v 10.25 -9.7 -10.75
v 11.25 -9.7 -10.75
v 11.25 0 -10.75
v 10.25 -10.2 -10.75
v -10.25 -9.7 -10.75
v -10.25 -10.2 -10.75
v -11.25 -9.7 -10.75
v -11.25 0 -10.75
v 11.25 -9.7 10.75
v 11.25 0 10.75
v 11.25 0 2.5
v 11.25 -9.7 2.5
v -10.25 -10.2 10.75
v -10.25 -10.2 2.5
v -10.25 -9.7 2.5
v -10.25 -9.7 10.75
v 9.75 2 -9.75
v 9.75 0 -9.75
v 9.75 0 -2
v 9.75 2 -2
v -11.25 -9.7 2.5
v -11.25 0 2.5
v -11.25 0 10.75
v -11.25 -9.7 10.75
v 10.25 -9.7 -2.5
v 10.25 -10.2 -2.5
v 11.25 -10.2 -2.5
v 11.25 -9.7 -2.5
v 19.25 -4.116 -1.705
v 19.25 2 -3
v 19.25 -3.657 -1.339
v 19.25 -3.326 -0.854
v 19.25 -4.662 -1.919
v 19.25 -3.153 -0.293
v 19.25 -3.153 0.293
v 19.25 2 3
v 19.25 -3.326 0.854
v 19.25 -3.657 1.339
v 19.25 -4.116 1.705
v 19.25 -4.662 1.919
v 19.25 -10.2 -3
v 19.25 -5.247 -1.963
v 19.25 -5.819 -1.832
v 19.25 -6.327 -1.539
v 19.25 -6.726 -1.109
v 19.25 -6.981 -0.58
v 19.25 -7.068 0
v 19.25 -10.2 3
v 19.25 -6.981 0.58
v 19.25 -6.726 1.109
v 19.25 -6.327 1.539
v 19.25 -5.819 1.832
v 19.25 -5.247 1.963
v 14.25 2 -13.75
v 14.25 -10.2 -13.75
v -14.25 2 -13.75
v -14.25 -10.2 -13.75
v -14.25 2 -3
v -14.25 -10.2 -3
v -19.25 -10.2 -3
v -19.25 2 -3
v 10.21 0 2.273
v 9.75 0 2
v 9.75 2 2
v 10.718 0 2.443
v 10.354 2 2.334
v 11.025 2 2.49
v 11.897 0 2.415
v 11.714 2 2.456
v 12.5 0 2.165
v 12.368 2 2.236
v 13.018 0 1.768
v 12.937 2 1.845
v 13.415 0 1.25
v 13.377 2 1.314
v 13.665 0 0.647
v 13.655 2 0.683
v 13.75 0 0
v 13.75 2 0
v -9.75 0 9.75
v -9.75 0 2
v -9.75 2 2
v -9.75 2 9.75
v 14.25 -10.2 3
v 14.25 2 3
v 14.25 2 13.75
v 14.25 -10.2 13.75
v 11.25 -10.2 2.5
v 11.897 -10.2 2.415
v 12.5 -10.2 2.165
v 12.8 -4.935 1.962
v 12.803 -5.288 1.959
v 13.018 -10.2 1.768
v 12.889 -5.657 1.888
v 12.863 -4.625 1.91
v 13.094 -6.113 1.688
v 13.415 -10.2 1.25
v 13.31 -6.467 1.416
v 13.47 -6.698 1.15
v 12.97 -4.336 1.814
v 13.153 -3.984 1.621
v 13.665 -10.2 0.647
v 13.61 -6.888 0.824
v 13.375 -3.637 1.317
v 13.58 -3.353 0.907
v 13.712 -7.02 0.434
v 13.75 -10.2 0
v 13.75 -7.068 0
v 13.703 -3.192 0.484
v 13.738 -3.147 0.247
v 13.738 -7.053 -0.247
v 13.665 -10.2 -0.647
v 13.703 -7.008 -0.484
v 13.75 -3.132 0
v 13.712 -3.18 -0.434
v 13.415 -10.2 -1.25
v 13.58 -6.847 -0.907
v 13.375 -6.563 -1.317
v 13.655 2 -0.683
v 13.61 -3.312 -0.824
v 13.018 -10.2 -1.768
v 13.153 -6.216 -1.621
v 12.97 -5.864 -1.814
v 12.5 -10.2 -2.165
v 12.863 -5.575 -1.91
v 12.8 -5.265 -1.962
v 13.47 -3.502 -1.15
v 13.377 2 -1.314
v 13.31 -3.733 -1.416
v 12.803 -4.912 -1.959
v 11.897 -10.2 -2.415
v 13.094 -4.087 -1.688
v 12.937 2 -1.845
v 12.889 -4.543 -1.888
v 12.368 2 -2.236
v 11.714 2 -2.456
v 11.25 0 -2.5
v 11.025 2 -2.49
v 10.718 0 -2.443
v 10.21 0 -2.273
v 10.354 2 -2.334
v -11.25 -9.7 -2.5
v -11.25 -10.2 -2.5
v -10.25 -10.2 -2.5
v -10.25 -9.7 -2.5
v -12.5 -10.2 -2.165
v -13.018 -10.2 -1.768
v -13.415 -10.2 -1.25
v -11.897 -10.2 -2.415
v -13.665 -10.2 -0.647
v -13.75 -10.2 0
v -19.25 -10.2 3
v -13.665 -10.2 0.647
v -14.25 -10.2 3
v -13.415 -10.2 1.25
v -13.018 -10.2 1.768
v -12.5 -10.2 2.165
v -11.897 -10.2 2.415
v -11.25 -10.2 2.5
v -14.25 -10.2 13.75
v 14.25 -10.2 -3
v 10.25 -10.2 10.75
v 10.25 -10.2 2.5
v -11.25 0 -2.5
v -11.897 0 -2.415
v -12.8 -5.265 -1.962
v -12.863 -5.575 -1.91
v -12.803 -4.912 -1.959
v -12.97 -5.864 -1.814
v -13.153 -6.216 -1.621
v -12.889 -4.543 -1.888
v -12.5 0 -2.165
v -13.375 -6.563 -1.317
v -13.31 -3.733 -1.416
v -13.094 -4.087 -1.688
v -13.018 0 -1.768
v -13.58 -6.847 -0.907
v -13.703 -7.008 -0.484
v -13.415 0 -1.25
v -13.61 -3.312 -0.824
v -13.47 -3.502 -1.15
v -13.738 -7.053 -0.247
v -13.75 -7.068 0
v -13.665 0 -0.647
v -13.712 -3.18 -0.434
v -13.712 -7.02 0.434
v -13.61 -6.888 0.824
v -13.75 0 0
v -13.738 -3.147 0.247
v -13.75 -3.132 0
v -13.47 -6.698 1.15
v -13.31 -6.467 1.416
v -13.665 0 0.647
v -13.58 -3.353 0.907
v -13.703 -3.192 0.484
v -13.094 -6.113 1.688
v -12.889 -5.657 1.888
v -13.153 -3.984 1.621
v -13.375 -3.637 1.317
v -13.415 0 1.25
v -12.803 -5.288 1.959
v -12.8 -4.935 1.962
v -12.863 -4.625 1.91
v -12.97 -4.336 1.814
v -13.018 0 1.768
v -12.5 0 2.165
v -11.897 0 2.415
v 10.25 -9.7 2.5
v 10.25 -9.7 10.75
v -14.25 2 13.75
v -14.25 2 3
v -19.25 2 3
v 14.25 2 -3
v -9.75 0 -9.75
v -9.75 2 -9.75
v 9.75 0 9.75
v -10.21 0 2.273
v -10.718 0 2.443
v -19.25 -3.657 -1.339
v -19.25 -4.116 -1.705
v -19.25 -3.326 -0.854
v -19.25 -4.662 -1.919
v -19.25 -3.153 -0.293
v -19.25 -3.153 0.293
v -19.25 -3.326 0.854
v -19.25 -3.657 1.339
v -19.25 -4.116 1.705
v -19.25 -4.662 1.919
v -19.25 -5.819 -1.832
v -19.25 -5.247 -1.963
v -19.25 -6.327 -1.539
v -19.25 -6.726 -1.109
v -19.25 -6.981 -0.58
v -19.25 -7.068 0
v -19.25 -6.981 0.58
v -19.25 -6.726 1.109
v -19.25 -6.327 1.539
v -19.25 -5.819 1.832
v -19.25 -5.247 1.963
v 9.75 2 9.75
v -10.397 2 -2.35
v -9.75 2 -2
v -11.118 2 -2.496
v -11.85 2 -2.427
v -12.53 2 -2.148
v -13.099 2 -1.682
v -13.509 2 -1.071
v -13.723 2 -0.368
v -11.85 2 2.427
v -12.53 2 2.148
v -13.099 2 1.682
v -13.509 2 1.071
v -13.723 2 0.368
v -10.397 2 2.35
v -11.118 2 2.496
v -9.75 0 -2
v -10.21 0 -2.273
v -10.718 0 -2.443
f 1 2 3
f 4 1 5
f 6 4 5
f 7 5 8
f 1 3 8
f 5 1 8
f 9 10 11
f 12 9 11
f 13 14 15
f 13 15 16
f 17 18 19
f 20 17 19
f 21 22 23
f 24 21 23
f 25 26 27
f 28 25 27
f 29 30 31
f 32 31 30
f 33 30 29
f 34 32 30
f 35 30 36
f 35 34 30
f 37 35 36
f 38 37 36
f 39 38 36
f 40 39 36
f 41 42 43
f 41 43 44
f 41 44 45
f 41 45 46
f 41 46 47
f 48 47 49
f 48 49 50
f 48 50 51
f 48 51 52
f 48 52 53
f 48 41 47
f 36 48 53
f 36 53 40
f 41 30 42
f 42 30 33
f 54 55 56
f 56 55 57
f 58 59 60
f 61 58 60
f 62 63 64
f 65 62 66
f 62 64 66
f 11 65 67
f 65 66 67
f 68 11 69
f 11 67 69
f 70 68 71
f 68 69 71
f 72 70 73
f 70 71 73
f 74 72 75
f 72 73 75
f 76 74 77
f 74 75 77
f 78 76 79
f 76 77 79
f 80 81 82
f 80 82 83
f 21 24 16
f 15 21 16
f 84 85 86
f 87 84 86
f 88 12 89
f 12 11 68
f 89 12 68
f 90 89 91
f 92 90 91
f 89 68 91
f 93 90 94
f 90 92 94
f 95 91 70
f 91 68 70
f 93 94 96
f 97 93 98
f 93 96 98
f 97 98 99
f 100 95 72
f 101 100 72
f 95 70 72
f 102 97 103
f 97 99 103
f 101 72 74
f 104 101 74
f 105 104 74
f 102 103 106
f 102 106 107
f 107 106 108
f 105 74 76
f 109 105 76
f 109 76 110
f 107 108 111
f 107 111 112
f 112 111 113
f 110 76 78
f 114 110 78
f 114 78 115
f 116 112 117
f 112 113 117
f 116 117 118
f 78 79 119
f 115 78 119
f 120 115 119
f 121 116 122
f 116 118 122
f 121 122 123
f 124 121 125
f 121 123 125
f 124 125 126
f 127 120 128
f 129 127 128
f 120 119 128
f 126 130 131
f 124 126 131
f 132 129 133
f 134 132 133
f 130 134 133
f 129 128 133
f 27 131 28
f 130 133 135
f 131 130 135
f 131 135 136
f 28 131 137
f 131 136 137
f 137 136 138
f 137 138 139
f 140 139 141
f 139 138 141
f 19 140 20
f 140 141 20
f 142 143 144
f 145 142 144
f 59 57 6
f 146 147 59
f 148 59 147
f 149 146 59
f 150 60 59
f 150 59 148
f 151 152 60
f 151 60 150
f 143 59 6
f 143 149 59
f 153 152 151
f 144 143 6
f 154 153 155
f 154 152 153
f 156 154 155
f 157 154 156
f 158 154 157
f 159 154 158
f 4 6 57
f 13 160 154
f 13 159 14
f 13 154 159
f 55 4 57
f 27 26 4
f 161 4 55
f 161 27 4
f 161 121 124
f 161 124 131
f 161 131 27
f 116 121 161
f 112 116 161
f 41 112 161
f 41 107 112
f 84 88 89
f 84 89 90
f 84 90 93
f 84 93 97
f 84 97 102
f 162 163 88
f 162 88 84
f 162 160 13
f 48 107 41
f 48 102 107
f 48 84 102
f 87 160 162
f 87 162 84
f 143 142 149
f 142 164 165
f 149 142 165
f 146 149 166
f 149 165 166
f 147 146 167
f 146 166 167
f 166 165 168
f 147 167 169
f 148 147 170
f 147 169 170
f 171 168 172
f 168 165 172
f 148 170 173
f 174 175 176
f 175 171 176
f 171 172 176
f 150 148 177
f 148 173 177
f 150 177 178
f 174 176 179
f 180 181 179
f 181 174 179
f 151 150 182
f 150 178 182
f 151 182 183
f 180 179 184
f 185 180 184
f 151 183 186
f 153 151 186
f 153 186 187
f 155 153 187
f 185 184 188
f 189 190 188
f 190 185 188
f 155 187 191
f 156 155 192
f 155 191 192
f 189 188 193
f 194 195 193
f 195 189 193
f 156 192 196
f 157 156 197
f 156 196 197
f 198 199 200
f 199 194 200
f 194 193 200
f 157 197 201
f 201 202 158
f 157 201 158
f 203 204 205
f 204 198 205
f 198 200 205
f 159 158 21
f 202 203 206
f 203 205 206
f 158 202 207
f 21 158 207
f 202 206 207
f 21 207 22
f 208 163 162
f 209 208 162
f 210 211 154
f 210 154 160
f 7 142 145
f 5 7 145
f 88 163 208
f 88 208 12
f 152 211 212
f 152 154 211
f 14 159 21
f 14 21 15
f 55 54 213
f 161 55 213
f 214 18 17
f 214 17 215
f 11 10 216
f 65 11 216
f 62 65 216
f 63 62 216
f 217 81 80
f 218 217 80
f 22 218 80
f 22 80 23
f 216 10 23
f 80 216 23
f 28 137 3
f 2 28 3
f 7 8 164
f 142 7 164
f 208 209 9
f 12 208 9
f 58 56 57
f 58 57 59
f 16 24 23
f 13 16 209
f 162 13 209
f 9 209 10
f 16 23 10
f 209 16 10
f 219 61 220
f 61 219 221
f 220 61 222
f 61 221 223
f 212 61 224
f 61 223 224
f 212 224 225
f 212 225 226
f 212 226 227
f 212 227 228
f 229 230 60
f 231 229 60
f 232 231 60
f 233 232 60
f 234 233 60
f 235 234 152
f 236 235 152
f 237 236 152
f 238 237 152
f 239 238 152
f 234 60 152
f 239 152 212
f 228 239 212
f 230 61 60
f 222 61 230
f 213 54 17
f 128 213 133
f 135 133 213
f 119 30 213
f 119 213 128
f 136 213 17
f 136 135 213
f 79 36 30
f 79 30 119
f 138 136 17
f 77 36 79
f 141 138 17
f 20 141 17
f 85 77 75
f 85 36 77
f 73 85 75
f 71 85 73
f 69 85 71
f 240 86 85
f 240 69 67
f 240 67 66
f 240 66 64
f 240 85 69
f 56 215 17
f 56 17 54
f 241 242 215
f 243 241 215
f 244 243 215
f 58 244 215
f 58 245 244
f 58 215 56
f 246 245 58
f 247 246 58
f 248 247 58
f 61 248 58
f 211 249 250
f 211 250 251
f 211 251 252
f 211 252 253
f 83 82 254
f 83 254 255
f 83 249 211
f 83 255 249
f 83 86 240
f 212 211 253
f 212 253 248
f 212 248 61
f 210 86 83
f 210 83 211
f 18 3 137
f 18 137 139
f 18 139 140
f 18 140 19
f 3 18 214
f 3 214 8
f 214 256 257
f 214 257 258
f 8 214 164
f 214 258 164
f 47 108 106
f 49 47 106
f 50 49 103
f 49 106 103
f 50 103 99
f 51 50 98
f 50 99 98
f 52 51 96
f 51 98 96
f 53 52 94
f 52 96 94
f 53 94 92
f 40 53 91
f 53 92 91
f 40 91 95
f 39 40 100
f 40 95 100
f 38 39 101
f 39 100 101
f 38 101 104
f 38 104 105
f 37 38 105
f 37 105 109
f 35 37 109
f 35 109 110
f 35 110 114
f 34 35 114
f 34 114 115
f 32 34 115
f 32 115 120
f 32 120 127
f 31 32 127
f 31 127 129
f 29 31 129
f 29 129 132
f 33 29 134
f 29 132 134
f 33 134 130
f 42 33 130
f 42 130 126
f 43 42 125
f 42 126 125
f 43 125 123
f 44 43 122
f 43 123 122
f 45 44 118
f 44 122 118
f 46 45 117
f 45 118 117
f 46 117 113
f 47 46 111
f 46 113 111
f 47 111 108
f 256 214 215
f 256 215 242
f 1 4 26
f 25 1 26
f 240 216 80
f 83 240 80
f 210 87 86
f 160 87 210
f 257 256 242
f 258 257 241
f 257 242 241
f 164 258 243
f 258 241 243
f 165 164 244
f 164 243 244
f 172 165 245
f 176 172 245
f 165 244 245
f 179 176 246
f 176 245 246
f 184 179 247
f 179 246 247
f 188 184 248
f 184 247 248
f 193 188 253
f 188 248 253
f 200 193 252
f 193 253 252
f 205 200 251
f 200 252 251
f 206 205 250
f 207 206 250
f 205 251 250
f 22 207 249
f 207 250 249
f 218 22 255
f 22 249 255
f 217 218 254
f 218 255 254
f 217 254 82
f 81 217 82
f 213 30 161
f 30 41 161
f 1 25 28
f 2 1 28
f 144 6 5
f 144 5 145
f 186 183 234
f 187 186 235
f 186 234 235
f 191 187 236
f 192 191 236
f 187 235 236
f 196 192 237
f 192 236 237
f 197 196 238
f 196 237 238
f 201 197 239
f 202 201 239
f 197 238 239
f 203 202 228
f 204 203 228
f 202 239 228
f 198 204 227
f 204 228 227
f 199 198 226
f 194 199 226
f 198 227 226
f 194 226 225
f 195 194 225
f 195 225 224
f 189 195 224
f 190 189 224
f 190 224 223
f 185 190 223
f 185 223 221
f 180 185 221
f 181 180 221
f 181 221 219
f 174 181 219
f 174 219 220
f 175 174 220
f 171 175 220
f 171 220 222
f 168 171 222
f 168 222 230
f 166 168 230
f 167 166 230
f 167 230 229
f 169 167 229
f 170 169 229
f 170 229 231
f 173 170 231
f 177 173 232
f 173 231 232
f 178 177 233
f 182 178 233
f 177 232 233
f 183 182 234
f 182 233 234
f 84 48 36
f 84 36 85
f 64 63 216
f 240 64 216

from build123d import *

# Parameters (mm, degrees)
F1_DEPTH  = 10.2
F2_W      = 28.5
F2_H      = 27.5
F2_W_2    = 19.5
F2_H_2    = 19.5
F3_DEPTH  = 2
F4_R      = 1.9685
F5_DEPTH  = 38.5
F6_W      = 5
F6_H      = 6
F7_DEPTH  = 2
F8_W      = 5
F8_H      = 6
F9_DEPTH  = 2
F10_W     = 1
F10_H     = 8.25
F11_DEPTH = 0.5
F12_R     = 2.5
F13_DEPTH = 12.201


with BuildPart() as f1:
    # F0 (on Front) → F1 (new body)
    with BuildSketch(Plane.XZ):
        with BuildLine():
            Line((-14.25, 3), (-19.25, 3))
            Line((-19.25, 3), (-19.25, 0))
            Line((-19.25, 0), (-13.75, 0))
            ThreePointArc((-13.75, 0), (-13.017766953, 1.767766953), (-11.25, 2.5))
            Line((-11.25, 2.5), (-11.25, 10.75))
            Line((-11.25, 10.75), (0, 10.75))
            Line((0, 10.75), (0, 13.75))
            Line((0, 13.75), (-14.25, 13.75))
            Line((-14.25, 13.75), (-14.25, 3))
        make_face()
        with BuildLine():
            Line((-13.75, 0), (-19.25, 0))
            Line((-19.25, 0), (-19.25, -3))
            Line((-19.25, -3), (-14.25, -3))
            Line((-14.25, -3), (-14.25, -13.75))
            Line((-14.25, -13.75), (0, -13.75))
            Line((0, -13.75), (0, -10.75))
            Line((0, -10.75), (-11.25, -10.75))
            Line((-11.25, -10.75), (-11.25, -2.5))
            ThreePointArc((-11.25, -2.5), (-13.017766953, -1.767766953), (-13.75, 0))
        make_face()
        with BuildLine():
            Line((14.25, 13.75), (0, 13.75))
            Line((0, 13.75), (0, 10.75))
            Line((0, 10.75), (11.25, 10.75))
            Line((11.25, 10.75), (11.25, 2.5))
            ThreePointArc((11.25, 2.5), (13.017766953, 1.767766953), (13.75, 0))
            Line((13.75, 0), (19.25, 0))
            Line((19.25, 0), (19.25, 3))
            Line((19.25, 3), (14.25, 3))
            Line((14.25, 3), (14.25, 13.75))
        make_face()
        with BuildLine():
            Line((11.25, -10.75), (0, -10.75))
            Line((0, -10.75), (0, -13.75))
            Line((0, -13.75), (14.25, -13.75))
            Line((14.25, -13.75), (14.25, -3))
            Line((14.25, -3), (19.25, -3))
            Line((19.25, -3), (19.25, 0))
            Line((19.25, 0), (13.75, 0))
            ThreePointArc((13.75, 0), (13.017766953, -1.767766953), (11.25, -2.5))
            Line((11.25, -2.5), (11.25, -10.75))
        make_face()
    extrude(amount=F1_DEPTH)

    # F2 (on face) → F3 (join)
    with BuildSketch(Plane(origin=(0, 0, 0), x_dir=(-1, 0, 0), z_dir=(0, 1, 0))):
        Rectangle(F2_W, F2_H)
        Rectangle(F2_W_2, F2_H_2, mode=Mode.SUBTRACT)
    extrude(amount=F3_DEPTH)

    # F4 (on face) → F5 (cut, through all)
    with BuildSketch(Plane(origin=(-19.25, 0, 0), x_dir=(0, -1, 0), z_dir=(-1, 0, 0))):
        with Locations((5.1, 0)):
            Circle(F4_R)
    extrude(amount=-F5_DEPTH, mode=Mode.SUBTRACT)

    # F6 (on face) → F7 (join, through all)
    with BuildSketch(Plane(origin=(0, 0, 0), x_dir=(-1, 0, 0), z_dir=(0, 1, 0))):
        with Locations((-16.75, 0)):
            Rectangle(F6_W, F6_H)
    extrude(amount=F7_DEPTH)

    # F8 (on face) → F9 (join, through all)
    with BuildSketch(Plane(origin=(0, 0, 0), x_dir=(-1, 0, 0), z_dir=(0, 1, 0))):
        with Locations((16.75, 0)):
            Rectangle(F8_W, F8_H)
    extrude(amount=F9_DEPTH)

    # F10 (on face) → F11 (join)
    with BuildSketch(Plane.XZ.offset(10.2)):
        with Locations((-10.75, 6.625)):
            Rectangle(F10_W, F10_H)
        with Locations((10.75, 6.625)):
            Rectangle(F10_W, F10_H)
        with Locations((-10.75, -6.625)):
            Rectangle(F10_W, F10_H)
        with Locations((10.75, -6.625)):
            Rectangle(F10_W, F10_H)
    extrude(amount=-F11_DEPTH)

    # F12 (on face) → F13 (cut, through all)
    with BuildSketch(Plane.XZ.offset(10.2)):
        with Locations((-11.25, 0)):
            Circle(F12_R)
        with Locations((11.25, 0)):
            Circle(F12_R)
    extrude(amount=-F13_DEPTH, mode=Mode.SUBTRACT)


solid = f1.part
